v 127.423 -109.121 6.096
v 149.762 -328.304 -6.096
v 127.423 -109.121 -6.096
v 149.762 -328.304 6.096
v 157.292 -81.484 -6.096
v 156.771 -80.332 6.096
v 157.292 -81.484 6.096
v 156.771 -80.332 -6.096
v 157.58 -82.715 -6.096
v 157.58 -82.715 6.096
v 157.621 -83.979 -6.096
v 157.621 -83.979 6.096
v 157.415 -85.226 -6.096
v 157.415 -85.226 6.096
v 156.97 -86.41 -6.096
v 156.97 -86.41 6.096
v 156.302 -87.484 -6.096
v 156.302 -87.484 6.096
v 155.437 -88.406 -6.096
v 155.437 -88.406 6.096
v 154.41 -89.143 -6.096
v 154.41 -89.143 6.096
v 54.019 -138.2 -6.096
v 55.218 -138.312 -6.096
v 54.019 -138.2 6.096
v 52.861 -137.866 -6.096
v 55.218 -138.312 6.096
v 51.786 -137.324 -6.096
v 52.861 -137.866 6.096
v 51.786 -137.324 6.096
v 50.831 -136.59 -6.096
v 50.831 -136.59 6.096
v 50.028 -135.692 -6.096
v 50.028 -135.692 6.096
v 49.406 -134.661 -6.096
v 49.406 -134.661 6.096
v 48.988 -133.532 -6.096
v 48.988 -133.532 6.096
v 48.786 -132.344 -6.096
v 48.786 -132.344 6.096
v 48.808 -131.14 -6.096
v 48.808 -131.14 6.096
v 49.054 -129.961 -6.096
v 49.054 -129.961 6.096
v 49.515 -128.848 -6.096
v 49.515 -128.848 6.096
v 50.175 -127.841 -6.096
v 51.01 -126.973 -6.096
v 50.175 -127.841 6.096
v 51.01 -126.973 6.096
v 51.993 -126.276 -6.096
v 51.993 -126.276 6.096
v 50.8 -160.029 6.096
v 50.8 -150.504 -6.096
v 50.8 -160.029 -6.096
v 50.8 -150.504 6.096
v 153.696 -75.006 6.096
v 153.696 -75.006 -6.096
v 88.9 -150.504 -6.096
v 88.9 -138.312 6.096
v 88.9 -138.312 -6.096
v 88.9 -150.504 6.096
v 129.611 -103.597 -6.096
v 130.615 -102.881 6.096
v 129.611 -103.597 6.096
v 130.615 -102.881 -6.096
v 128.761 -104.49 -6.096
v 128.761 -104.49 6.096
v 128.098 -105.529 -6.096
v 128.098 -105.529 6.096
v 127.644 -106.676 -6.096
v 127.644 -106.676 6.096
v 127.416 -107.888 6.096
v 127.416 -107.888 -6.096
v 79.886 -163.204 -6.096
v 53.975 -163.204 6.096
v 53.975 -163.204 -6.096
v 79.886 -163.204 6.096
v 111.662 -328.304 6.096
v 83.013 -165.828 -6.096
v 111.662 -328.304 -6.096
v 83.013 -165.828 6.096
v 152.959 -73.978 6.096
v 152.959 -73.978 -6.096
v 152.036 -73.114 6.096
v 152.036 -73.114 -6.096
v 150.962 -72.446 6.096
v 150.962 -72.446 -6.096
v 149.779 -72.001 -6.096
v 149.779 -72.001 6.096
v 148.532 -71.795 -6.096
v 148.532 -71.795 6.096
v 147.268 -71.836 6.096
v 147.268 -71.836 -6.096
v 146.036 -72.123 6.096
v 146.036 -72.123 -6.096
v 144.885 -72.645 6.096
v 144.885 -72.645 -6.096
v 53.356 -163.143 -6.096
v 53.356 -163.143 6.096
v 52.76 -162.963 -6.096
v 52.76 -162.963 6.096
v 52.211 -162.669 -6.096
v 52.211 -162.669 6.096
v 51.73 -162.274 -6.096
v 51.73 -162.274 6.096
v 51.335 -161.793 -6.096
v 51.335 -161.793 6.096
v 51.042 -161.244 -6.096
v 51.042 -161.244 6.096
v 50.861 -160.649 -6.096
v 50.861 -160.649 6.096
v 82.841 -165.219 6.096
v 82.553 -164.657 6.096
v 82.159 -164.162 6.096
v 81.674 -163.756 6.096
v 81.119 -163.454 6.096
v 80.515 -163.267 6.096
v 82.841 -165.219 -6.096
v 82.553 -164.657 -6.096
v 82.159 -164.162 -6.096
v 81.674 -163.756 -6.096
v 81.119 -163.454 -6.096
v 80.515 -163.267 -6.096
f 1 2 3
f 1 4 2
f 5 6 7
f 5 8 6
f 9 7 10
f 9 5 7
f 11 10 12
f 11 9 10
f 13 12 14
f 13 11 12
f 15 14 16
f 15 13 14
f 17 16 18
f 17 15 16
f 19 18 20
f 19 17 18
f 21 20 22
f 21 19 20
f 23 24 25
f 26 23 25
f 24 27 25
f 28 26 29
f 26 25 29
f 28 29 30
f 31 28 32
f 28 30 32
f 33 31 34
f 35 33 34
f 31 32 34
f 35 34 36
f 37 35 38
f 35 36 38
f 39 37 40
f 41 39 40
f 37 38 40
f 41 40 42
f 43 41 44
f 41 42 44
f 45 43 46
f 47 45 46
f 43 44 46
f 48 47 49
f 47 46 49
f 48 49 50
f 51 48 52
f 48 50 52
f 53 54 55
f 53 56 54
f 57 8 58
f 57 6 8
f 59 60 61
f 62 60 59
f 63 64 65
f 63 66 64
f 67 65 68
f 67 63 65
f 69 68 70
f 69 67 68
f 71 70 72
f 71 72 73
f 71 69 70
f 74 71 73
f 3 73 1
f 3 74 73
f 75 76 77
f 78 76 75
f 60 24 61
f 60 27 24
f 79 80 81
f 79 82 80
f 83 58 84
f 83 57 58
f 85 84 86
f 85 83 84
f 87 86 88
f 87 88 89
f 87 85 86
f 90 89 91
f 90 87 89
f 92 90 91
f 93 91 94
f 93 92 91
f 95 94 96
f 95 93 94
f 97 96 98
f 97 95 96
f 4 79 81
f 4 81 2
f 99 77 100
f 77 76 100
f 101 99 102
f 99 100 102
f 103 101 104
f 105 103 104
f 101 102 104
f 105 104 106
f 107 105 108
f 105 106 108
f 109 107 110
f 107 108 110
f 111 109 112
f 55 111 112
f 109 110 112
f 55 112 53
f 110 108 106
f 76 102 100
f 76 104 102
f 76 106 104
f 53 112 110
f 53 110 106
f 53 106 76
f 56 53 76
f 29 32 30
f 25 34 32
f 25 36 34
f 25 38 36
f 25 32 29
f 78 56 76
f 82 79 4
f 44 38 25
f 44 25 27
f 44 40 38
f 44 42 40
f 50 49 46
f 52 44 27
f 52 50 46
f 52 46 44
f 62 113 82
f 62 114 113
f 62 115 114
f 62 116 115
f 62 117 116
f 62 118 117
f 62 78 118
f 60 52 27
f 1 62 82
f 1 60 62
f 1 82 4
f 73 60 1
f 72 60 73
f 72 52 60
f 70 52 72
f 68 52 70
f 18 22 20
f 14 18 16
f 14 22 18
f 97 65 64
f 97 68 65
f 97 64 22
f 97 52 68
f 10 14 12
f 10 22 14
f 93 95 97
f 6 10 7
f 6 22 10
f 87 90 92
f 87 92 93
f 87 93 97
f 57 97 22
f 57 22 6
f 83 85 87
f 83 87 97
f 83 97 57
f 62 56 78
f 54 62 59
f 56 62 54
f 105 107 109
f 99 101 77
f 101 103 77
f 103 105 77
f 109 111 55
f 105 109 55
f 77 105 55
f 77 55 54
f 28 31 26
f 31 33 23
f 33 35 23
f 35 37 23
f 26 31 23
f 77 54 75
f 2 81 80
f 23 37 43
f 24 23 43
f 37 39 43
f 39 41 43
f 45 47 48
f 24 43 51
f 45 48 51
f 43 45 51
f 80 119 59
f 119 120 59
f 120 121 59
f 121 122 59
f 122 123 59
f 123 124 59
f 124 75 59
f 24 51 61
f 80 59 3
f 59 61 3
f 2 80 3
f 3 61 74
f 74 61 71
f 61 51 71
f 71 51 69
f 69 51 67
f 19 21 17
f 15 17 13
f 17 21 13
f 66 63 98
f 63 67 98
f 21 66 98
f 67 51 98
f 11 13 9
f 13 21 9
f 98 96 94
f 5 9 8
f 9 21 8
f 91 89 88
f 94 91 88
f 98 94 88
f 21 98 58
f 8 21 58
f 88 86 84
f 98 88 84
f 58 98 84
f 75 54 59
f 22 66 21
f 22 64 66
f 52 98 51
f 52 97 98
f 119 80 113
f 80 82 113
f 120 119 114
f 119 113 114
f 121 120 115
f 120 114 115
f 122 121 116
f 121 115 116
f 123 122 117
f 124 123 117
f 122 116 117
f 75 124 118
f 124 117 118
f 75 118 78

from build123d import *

# Parameters (mm, degrees)
BOSS_EXTRUDE1_DEPTH = 6.096
FILLET1_R           = 6.45
FILLET2_R           = 3.175


with BuildPart() as part:
    # Sketch1 → Boss-Extrude1 (new, symmetric)
    with BuildSketch(Plane.XY):
        Polygon((159.995567884, -85.917938074), (150.470567884, -69.420154132), (31.146005713, -138.312222222), (88.9, -138.312222222), (88.9, -150.504222222), (50.8, -150.504222222), (50.8, -163.204222222), (82.55, -163.204222222), (111.661584515, -328.304222222), (149.761584515, -328.304222222), (127, -104.967938074), align=None)
    extrude(amount=BOSS_EXTRUDE1_DEPTH, both=True)

    # Fillet1
    fillet1_edges = [part.edges().sort_by_distance(p)[0] for p in [
        (127, -104.967938074, 0),
        (31.146005713, -138.312222222, 0),
        (150.470567884, -69.420154132, 0),
        (159.995567884, -85.917938074, 0),
    ]]
    fillet(fillet1_edges, radius=FILLET1_R)

    # Fillet2
    fillet2_edges = [part.edges().sort_by_distance(p)[0] for p in [
        (82.55, -163.204222222, 0),
        (50.8, -163.204222222, 0),
    ]]
    fillet(fillet2_edges, radius=FILLET2_R)


solid = part.part
